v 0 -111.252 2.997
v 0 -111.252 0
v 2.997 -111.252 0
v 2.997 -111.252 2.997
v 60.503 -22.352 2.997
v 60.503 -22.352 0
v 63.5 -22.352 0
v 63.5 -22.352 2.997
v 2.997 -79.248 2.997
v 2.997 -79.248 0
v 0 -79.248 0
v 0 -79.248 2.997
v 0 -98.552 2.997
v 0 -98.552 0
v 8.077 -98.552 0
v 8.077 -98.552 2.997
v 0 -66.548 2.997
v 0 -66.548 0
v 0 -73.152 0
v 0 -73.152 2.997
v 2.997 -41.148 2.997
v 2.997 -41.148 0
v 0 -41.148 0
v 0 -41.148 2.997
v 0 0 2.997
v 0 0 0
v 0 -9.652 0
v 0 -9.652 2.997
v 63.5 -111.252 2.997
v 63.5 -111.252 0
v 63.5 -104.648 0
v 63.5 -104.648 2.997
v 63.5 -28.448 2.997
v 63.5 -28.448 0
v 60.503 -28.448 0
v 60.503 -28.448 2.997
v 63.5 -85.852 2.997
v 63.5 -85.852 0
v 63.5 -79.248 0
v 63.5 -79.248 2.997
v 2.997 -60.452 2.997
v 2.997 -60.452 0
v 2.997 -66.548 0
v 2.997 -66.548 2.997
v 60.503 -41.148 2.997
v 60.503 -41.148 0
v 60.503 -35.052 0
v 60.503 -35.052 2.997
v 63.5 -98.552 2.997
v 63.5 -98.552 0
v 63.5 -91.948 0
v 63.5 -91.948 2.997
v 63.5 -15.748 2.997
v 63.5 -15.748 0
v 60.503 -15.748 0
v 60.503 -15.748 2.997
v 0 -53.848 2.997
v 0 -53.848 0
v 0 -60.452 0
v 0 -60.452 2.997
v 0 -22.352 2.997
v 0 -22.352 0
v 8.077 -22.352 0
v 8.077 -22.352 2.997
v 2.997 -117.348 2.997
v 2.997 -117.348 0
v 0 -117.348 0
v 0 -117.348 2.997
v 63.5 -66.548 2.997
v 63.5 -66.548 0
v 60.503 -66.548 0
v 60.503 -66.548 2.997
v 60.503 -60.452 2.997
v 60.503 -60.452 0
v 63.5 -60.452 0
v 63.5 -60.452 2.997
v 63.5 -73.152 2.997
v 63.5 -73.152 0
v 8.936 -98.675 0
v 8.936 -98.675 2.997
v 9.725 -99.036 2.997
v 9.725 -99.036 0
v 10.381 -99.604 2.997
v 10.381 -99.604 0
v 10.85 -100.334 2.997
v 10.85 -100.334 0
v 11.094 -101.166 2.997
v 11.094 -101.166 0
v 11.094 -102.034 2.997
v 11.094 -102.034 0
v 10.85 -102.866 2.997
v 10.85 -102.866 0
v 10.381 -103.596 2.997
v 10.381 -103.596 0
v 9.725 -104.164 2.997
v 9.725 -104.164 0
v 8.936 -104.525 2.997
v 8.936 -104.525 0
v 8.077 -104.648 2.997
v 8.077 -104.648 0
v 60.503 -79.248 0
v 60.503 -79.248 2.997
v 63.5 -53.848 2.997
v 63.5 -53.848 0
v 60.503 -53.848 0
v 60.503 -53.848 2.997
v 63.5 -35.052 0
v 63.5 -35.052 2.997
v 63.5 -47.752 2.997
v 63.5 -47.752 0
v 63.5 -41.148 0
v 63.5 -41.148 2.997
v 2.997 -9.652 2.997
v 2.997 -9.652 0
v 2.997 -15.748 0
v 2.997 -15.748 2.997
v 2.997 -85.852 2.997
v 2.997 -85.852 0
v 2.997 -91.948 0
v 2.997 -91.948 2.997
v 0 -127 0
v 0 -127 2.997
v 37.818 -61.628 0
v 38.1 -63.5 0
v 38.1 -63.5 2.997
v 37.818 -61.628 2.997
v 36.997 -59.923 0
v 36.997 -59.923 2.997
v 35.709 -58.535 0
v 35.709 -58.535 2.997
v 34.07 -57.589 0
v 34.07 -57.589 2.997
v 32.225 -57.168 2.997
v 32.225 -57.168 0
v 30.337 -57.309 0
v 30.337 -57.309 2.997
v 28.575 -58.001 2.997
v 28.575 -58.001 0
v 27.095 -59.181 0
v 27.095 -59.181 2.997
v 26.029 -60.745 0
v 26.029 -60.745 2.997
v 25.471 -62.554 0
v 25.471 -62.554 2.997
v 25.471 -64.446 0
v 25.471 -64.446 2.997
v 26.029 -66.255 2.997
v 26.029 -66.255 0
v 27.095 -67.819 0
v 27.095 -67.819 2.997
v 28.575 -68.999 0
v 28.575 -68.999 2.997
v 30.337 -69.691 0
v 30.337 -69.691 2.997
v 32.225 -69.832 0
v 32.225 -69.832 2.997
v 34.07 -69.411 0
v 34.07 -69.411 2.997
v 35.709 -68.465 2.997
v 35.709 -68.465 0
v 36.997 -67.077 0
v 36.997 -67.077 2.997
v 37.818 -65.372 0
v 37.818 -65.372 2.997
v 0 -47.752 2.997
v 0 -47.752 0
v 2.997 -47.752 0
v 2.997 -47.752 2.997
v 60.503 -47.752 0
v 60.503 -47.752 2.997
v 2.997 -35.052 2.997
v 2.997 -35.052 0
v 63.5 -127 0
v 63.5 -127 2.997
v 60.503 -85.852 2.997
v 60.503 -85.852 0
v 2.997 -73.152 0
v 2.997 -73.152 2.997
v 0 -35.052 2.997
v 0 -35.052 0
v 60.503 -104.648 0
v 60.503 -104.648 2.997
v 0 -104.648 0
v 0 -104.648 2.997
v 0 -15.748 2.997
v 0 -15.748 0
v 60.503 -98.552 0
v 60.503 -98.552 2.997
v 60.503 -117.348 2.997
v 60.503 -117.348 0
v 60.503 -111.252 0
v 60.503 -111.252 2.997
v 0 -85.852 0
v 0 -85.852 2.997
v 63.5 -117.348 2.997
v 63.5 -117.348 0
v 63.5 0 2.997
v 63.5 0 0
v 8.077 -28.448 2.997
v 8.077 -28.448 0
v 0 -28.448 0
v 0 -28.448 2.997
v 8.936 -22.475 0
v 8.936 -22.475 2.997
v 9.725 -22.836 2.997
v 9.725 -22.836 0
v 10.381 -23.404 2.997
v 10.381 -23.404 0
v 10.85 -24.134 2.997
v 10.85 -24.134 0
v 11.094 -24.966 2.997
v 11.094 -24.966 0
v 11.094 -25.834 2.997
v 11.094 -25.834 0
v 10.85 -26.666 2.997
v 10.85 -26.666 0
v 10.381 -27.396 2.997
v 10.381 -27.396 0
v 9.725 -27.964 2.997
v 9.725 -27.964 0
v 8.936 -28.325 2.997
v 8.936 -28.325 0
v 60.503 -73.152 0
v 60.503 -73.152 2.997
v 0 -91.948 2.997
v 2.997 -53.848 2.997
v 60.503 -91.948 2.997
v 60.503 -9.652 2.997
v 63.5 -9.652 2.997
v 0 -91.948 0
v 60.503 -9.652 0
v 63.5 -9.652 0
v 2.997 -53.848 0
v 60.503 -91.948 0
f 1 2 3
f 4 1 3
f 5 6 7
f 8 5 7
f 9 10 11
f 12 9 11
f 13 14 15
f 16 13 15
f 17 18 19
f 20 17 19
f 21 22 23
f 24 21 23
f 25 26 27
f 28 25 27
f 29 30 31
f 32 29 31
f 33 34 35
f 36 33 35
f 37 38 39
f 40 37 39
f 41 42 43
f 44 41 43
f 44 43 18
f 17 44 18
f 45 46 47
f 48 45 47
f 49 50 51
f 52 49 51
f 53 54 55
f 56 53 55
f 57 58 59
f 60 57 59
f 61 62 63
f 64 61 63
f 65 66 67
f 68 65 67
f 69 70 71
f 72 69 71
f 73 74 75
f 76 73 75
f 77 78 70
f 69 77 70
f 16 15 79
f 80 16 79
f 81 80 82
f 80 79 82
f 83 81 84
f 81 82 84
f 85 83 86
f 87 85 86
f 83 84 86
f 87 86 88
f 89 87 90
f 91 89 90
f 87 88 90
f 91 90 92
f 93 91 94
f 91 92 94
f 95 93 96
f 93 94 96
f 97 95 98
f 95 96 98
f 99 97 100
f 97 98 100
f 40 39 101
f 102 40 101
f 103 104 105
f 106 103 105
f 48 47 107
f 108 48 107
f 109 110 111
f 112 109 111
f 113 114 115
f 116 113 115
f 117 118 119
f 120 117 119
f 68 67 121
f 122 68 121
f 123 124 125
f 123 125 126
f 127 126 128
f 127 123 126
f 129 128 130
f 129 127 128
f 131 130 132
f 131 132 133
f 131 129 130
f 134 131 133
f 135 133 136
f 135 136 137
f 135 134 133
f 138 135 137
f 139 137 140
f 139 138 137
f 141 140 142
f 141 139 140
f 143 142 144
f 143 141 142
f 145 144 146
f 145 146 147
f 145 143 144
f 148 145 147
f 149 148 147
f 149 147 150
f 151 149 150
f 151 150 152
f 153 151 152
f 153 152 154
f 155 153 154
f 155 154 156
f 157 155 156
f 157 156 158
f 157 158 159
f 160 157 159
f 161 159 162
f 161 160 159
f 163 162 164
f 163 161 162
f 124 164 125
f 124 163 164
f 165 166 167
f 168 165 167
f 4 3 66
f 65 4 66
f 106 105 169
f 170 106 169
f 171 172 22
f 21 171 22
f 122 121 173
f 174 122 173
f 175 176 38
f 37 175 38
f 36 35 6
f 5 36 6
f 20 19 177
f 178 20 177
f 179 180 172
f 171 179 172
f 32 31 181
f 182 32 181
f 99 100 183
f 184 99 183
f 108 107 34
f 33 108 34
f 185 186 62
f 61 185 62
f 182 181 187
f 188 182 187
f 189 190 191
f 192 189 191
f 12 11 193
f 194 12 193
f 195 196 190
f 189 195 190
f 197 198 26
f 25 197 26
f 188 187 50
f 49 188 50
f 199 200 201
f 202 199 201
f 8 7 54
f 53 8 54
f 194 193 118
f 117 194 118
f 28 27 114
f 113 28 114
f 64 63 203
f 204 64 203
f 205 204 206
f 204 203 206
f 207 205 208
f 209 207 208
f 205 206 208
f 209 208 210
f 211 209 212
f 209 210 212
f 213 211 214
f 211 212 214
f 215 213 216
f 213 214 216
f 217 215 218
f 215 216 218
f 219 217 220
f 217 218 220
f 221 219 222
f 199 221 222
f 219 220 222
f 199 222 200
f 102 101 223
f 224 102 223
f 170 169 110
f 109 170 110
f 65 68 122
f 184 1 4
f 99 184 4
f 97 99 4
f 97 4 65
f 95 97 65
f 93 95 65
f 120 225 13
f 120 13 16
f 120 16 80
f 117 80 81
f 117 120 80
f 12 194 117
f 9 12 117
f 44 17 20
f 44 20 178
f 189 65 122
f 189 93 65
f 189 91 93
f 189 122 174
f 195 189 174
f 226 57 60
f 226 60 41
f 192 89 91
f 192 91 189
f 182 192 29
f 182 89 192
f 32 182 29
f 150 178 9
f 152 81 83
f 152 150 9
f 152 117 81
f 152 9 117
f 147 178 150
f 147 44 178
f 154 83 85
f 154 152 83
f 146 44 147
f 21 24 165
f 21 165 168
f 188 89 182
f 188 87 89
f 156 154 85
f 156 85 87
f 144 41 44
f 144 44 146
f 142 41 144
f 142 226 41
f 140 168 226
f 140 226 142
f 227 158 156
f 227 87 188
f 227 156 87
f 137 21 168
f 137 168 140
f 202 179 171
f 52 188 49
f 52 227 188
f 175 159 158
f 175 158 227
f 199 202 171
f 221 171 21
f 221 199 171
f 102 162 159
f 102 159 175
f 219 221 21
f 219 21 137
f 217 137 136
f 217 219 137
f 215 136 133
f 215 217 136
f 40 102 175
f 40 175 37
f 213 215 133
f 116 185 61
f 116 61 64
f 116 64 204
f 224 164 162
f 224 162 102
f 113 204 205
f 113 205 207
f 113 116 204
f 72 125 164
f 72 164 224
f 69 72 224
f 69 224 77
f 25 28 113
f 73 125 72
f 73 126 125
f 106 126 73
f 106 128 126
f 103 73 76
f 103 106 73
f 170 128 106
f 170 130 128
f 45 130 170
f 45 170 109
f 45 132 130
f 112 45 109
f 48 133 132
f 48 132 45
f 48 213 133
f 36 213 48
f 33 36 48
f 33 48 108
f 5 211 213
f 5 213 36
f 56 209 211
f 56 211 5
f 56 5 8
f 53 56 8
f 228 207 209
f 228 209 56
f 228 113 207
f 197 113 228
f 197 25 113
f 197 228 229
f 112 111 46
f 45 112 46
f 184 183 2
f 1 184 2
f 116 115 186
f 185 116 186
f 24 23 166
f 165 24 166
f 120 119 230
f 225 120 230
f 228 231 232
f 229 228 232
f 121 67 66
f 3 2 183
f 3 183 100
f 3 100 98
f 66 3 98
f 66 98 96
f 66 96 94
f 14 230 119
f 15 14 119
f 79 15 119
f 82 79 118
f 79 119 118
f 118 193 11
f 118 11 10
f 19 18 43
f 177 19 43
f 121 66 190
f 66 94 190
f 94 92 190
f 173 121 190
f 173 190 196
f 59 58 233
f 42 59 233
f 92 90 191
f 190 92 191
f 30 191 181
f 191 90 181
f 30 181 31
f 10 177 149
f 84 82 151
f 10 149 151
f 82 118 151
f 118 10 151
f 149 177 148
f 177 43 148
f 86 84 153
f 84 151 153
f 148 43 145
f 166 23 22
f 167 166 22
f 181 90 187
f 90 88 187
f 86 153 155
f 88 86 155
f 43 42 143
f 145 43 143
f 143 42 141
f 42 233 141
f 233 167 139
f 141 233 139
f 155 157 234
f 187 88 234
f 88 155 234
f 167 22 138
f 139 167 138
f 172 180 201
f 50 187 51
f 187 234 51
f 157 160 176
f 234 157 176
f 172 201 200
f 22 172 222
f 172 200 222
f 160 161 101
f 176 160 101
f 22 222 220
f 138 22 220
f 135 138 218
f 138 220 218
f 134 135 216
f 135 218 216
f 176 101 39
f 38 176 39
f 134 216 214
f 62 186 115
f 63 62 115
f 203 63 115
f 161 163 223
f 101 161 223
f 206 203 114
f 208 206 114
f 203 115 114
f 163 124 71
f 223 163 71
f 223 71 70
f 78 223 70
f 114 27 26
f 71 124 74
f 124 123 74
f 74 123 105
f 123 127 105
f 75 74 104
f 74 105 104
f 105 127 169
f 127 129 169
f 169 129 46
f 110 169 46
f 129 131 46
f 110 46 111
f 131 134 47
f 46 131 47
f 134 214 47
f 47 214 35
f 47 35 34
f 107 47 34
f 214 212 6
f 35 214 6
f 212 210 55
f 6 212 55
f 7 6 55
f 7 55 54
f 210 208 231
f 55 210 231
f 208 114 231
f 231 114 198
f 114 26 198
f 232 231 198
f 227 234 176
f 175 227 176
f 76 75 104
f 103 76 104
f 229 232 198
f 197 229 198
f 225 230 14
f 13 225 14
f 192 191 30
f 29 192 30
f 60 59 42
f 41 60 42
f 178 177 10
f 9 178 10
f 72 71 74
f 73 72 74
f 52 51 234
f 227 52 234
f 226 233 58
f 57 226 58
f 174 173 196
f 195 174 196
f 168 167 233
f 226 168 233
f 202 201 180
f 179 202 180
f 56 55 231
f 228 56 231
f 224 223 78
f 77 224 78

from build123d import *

# Parameters (mm, degrees)
SKETCH1_R           = 6.35
BOSS_EXTRUDE2_DEPTH = 2.9972


with BuildPart() as part:
    # Sketch1 → Boss-Extrude2 (new body)
    with BuildSketch(Plane.XY):
        with BuildLine():
            Line((0, 0), (0, -9.652))
            Line((0, -9.652), (2.9972, -9.652))
            Line((2.9972, -9.652), (2.9972, -15.748))
            Line((2.9972, -15.748), (0, -15.748))
            Line((0, -15.748), (0, -22.352))
            Line((0, -22.352), (2.9972, -22.352))
            Line((2.9972, -22.352), (8.0772, -22.352))
            ThreePointArc((8.0772, -22.352), (11.1252, -25.4), (8.0772, -28.448))
            Line((8.0772, -28.448), (2.9972, -28.448))
            Line((2.9972, -28.448), (0, -28.448))
            Line((0, -28.448), (0, -35.052))
            Line((0, -35.052), (2.9972, -35.052))
            Line((2.9972, -35.052), (2.9972, -41.148))
            Line((2.9972, -41.148), (0, -41.148))
            Line((0, -41.148), (0, -47.752))
            Line((0, -47.752), (2.9972, -47.752))
            Line((2.9972, -47.752), (2.9972, -53.848))
            Line((2.9972, -53.848), (0, -53.848))
            Line((0, -53.848), (0, -60.452))
            Line((0, -60.452), (2.9972, -60.452))
            Line((2.9972, -60.452), (2.9972, -66.548))
            Line((2.9972, -66.548), (0, -66.548))
            Line((0, -66.548), (0, -73.152))
            Line((0, -73.152), (2.9972, -73.152))
            Line((2.9972, -73.152), (2.9972, -79.248))
            Line((2.9972, -79.248), (0, -79.248))
            Line((0, -79.248), (0, -85.852))
            Line((0, -85.852), (2.9972, -85.852))
            Line((2.9972, -85.852), (2.9972, -91.948))
            Line((2.9972, -91.948), (0, -91.948))
            Line((0, -91.948), (0, -98.552))
            Line((0, -98.552), (2.9972, -98.552))
            Line((2.9972, -98.552), (8.0772, -98.552))
            ThreePointArc((8.0772, -98.552), (11.1252, -101.6), (8.0772, -104.648))
            Line((8.0772, -104.648), (2.9972, -104.648))
            Line((2.9972, -104.648), (0, -104.648))
            Line((0, -104.648), (0, -111.252))
            Line((0, -111.252), (2.9972, -111.252))
            Line((2.9972, -111.252), (2.9972, -117.348))
            Line((2.9972, -117.348), (0, -117.348))
            Line((0, -117.348), (0, -127))
            Line((0, -127), (63.5, -127))
            Line((63.5, -127), (63.5, -117.348))
            Line((63.5, -117.348), (60.5028, -117.348))
            Line((60.5028, -117.348), (60.5028, -111.252))
            Line((60.5028, -111.252), (63.5, -111.252))
            Line((63.5, -111.252), (63.5, -104.648))
            Line((63.5, -104.648), (60.5028, -104.648))
            Line((60.5028, -104.648), (60.5028, -98.552))
            Line((60.5028, -98.552), (63.5, -98.552))
            Line((63.5, -98.552), (63.5, -91.948))
            Line((63.5, -91.948), (60.5028, -91.948))
            Line((60.5028, -91.948), (60.5028, -85.852))
            Line((60.5028, -85.852), (63.5, -85.852))
            Line((63.5, -85.852), (63.5, -79.248))
            Line((63.5, -79.248), (60.5028, -79.248))
            Line((60.5028, -79.248), (60.5028, -73.152))
            Line((60.5028, -73.152), (63.5, -73.152))
            Line((63.5, -73.152), (63.5, -66.548))
            Line((63.5, -66.548), (60.5028, -66.548))
            Line((60.5028, -66.548), (60.5028, -60.452))
            Line((60.5028, -60.452), (63.5, -60.452))
            Line((63.5, -60.452), (63.5, -53.848))
            Line((63.5, -53.848), (60.5028, -53.848))
            Line((60.5028, -53.848), (60.5028, -47.752))
            Line((60.5028, -47.752), (63.5, -47.752))
            Line((63.5, -47.752), (63.5, -41.148))
            Line((63.5, -41.148), (60.5028, -41.148))
            Line((60.5028, -41.148), (60.5028, -35.052))
            Line((60.5028, -35.052), (63.5, -35.052))
            Line((63.5, -35.052), (63.5, -28.448))
            Line((63.5, -28.448), (60.5028, -28.448))
            Line((60.5028, -28.448), (60.5028, -22.352))
            Line((60.5028, -22.352), (63.5, -22.352))
            Line((63.5, -22.352), (63.5, -15.748))
            Line((63.5, -15.748), (60.5028, -15.748))
            Line((60.5028, -15.748), (60.5028, -9.652))
            Line((60.5028, -9.652), (63.5, -9.652))
            Line((63.5, -9.652), (63.5, 0))
            Line((63.5, 0), (0, 0))
        make_face()
        with Locations((31.75, -63.5)):
            Circle(SKETCH1_R, mode=Mode.SUBTRACT)
    extrude(amount=BOSS_EXTRUDE2_DEPTH)


solid = part.part
